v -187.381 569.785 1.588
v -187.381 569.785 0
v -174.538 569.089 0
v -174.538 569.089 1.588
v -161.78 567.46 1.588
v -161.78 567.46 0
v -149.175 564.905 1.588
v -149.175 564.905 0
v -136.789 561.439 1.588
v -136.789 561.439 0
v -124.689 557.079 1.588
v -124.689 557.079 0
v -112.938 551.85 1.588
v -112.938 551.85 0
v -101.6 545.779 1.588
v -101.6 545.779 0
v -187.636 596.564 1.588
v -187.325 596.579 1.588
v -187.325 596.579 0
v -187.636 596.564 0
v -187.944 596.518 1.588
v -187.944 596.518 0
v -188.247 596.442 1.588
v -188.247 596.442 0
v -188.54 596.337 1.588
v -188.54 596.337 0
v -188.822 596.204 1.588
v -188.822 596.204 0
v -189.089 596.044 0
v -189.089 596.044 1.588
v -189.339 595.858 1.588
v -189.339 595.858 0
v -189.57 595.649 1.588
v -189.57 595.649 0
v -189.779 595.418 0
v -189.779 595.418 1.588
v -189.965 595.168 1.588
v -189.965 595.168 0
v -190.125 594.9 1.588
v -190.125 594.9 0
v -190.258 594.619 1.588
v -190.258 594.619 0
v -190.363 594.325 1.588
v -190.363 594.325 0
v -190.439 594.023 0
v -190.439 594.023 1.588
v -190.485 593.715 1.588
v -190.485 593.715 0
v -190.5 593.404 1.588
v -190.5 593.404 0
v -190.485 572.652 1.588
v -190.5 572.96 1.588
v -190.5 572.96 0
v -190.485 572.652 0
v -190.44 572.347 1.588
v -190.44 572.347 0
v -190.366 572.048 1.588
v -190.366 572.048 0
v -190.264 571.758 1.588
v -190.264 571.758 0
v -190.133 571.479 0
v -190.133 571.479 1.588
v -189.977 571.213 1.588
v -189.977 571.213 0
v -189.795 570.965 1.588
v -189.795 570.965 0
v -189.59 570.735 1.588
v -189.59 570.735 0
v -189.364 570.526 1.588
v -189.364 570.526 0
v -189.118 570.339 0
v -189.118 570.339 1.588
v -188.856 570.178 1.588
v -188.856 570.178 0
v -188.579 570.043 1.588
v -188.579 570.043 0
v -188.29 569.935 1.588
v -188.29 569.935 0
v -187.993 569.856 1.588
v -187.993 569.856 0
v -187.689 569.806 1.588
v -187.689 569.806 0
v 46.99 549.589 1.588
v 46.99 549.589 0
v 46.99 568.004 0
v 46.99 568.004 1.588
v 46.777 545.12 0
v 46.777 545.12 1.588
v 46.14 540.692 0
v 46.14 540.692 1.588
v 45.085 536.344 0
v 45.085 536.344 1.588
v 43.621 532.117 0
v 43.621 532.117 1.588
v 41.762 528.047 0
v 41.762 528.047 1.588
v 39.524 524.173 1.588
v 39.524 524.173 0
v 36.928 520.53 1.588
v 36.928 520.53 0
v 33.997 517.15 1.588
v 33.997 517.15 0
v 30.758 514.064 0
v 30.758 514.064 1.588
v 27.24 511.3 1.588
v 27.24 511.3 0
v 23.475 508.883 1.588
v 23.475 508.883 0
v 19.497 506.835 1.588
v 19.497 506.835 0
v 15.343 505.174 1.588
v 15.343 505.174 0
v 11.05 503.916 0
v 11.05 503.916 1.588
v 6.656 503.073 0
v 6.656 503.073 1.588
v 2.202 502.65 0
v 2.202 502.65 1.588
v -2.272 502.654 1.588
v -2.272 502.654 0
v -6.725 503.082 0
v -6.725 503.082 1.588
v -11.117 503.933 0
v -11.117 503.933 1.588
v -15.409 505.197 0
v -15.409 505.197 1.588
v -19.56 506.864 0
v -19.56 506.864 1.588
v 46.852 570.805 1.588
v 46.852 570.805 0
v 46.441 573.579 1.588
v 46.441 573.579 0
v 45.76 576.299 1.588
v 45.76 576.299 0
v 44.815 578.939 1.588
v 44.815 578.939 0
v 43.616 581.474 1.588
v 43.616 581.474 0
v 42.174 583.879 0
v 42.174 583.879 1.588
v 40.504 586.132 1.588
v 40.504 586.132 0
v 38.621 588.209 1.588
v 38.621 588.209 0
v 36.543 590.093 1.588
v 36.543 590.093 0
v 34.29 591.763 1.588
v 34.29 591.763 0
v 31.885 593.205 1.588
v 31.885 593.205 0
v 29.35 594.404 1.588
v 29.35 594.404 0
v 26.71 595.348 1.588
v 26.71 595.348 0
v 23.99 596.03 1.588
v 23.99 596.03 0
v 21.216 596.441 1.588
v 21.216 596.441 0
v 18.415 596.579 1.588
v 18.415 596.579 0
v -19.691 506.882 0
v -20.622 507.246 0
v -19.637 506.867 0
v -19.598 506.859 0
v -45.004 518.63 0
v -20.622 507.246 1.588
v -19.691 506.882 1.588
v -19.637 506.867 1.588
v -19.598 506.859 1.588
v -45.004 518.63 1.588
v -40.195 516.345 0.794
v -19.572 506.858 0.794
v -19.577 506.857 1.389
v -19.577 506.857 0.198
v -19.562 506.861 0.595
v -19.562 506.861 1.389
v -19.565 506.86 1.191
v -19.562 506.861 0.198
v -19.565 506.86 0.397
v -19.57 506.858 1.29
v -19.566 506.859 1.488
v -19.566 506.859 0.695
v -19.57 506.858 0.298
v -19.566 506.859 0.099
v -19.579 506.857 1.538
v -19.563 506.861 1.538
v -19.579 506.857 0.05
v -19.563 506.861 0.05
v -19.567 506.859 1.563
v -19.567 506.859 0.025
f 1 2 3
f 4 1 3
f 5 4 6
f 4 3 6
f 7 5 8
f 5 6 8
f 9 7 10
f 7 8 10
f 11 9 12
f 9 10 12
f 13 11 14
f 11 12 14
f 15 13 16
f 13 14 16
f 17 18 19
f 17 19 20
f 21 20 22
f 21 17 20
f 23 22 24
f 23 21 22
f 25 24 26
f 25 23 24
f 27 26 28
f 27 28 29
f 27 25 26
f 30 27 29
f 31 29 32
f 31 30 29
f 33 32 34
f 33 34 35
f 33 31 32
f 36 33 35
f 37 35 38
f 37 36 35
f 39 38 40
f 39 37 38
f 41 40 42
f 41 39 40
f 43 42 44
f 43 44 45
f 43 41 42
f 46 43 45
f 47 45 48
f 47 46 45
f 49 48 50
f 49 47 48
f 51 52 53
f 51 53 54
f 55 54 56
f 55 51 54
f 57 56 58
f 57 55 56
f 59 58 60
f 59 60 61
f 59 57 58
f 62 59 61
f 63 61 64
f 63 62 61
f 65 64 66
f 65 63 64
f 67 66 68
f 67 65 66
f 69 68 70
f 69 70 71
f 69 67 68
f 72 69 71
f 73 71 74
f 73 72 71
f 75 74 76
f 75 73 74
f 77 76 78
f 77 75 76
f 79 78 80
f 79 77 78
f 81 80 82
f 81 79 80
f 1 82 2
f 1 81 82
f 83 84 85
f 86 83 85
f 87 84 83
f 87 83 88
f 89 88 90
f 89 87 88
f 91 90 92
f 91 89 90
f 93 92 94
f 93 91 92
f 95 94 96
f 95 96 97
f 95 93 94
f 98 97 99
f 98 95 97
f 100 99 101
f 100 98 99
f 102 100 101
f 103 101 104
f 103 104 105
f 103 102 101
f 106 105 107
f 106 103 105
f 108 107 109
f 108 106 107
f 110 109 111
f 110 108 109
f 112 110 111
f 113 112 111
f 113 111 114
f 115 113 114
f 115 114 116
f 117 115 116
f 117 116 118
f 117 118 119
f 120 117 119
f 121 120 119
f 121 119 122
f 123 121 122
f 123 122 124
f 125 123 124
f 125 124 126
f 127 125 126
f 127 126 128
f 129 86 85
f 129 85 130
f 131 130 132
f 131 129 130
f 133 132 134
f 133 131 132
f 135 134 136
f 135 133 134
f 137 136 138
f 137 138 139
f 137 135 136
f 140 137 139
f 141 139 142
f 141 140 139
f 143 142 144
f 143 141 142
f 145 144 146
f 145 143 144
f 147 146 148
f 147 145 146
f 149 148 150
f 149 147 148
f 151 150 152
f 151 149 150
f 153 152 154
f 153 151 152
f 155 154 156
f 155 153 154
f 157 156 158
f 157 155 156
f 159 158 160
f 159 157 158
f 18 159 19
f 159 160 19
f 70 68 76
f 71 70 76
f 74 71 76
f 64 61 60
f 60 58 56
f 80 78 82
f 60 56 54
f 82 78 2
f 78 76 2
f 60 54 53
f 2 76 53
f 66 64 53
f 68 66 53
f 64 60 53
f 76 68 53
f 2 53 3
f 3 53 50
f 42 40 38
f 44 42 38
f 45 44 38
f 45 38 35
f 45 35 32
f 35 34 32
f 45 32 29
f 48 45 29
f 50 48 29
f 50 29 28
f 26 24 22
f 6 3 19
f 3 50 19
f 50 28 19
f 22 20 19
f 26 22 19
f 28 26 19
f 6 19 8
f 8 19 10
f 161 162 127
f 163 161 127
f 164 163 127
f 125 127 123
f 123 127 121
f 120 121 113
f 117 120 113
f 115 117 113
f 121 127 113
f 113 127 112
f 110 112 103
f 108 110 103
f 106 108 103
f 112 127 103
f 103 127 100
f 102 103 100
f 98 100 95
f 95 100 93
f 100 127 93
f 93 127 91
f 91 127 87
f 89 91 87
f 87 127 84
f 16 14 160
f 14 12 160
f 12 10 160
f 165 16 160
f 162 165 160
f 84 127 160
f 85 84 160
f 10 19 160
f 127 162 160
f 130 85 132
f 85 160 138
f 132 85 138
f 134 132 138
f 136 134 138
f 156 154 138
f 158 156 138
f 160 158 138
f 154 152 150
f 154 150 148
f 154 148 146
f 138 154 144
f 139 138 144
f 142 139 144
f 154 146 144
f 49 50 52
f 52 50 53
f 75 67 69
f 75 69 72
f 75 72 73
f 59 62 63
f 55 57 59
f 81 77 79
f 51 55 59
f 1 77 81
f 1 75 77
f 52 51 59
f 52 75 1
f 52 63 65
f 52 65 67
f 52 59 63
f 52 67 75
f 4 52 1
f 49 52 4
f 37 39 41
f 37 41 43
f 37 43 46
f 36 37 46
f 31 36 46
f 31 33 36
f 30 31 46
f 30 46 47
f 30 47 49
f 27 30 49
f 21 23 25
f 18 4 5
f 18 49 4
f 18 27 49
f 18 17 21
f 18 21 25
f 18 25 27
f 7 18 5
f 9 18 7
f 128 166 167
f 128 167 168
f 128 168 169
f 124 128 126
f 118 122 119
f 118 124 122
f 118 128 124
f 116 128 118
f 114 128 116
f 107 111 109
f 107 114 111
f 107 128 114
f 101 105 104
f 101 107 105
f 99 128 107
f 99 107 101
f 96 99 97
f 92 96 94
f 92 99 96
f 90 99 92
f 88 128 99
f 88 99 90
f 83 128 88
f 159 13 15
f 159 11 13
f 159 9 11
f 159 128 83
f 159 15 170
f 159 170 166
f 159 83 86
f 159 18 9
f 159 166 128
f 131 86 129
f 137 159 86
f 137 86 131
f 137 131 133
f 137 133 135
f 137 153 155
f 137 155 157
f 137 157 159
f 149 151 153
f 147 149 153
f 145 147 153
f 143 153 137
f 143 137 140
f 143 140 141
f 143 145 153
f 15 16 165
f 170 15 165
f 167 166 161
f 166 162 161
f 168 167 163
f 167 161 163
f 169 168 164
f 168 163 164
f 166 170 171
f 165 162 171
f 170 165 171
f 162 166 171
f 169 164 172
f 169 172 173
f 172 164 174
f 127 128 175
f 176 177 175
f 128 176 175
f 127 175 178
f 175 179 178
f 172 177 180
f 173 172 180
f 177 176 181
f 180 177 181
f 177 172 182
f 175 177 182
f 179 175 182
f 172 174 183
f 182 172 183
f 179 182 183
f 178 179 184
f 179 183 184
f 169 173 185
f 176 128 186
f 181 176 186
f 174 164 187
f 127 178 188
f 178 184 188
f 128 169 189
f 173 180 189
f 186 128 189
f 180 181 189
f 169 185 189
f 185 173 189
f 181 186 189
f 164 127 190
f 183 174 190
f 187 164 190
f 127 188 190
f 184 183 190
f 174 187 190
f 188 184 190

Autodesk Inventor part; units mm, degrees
ref_plane "YZ Plane" through (0, 0, 0) normal (1, 0, 0) x (0, 1, 0)
ref_plane "XZ Plane" through (0, 0, 0) normal (0, 1, 0) x (-1, 0, 0)
ref_plane "XY Plane" through (0, 0, 0) normal (0, 0, 1) x (1, 0, 0)
sketch "Sketch1" plane through (0, 0, 0) normal (0, 0, 1) x (1, 0, 0)
  circle A0 centre (0, 0) radius 25.4
  line L0 (0, 25.4) -> (-203.2, 25.4)
  line L1 (-203.2, 25.4) -> (-203.2, -12.7)
  line L2 (25.4, 0) -> (203.2, 0) construction
  line L3 (203.2, 0) -> (203.2, -127) construction
  arc A1 (203.2, -127) -> (-203.2, -12.7) centre (-98.0265, -418.3887) ccw construction
  line L4 (-203.2, 25.4) -> (-203.2, -50.8) construction
  arc A2 (203.2, -222.1538) -> (-203.2, -12.7) centre (-125.6377, -361.1999) ccw
  line L5 (-203.2, 25.4) -> (-203.2, 36.3602)
  line L6 (25.4, 0) -> (25.4, 25.4)
  line L7 (25.4, 25.4) -> (0, 25.4)
  circle A3 centre (0, 549.5888) radius 46.99
  line L8 (0, 596.5788) -> (-190.5, 596.5788)
  line L9 (46.99, 549.5888) -> (46.99, 596.5788)
  line L10 (46.99, 596.5788) -> (0, 596.5788)
  line L11 (46.99, 596.5788) -> (224.79, 596.5788)
  line L12 (224.79, 596.5788) -> (224.79, 190.1788)
  line L13 (0, 596.5788) -> (-190.5, 596.5788) construction
  line L14 (-190.5, 596.5788) -> (-190.5, 558.4788) construction
  line L15 (-190.5, 596.5788) -> (-190.5, 558.4788)
  line L16 (-190.5, 596.5788) -> (0, 596.5788)
  line L17 (0, 596.5788) -> (-101.6, 596.5788)
  line L18 (-101.6, 596.5788) -> (-101.6, 545.7788)
  line L19 (-101.6, 545.7788) -> (-46.99, 545.7788)
  line L20 (224.79, 190.1788) -> (-334.01, 190.1788)
  line L21 (23.495, -36.812) -> (-174.1484, -525.1707)
  line L22 (203.2, -222.1538) -> (-203.2, -12.7)
  line L23 (224.79, 264.9183) -> (-394.0921, 264.9183)
  line L24 (224.79, 596.5788) -> (224.79, 393.3788)
  line L25 (224.79, 393.3788) -> (-334.01, 393.3788)
  line L26 (0, 502.5988) -> (0, 393.3788)
  arc A4 (-101.6, 545.7788) -> (-247.5257, 560.3429) centre (-190.5, 393.3788) ccw
  spline S0 degree 2 poles (-101.6, 545.7788) (2.3295, 495.7011) (-25.4, 510.0552) knots 0 0 0 1 1 1
  point P0 (-19.5605, 506.8635)
  point P1 (-190.5, 569.8128)
  dimension "d0" = 50.8
  dimension "d1" = 203.2
  dimension "d2" = 177.8
  dimension "d3" = 127
  dimension "d4" = 38.1
  dimension "d5" = 419.1
  dimension "d6" = 76.2
  dimension "d7" = 457.2
  dimension "d8" = 93.98
  dimension "d11" = 177.8
  dimension "d12" = 406.4
  dimension "d13" = 190.5
  dimension "d14" = 38.1
  dimension "d18" = 101.6
  dimension "d19" = 558.8
  dimension "d20" = 203.2
  dimension "d21" = 558.8
extrude "Extrusion2" add sketch "Sketch1" along normal blind 1.5875 contours A3 S0 | A3 L10 L9 | A3 S0 L18 L8 | S0 A3 | L18 A4 L15 L8
fillet "Fillet2" radius 28.575 1 edges at (46.99, 596.5788, 0.7937)
fillet "Fillet3" radius 3.175 1 edges at (-190.5, 596.5788, 0.7937)
fillet "Fillet4" radius 3.175 1 edges at (-190.5, 569.8128, 0.7937)
sketch "Sketch3" plane through (0, 0, 1.5875) normal (0, 0, 1) x (1, 0, 0)
  circle A0 centre (-186.1685, 576.5475) radius 2.54
  point P0 (0, 0)
  dimension "d27" = 5.08
sketch "Sketch4" plane through (0, 0, 1.5875) normal (0, 0, 1) x (1, 0, 0)
  line L0 (-190.5, 593.4038) -> (-190.5, 572.9597) projected
  line L1 (46.99, 549.5888) -> (46.99, 568.0038) projected
  point P0 (0, 0)
properties part number "Better intake poly"
